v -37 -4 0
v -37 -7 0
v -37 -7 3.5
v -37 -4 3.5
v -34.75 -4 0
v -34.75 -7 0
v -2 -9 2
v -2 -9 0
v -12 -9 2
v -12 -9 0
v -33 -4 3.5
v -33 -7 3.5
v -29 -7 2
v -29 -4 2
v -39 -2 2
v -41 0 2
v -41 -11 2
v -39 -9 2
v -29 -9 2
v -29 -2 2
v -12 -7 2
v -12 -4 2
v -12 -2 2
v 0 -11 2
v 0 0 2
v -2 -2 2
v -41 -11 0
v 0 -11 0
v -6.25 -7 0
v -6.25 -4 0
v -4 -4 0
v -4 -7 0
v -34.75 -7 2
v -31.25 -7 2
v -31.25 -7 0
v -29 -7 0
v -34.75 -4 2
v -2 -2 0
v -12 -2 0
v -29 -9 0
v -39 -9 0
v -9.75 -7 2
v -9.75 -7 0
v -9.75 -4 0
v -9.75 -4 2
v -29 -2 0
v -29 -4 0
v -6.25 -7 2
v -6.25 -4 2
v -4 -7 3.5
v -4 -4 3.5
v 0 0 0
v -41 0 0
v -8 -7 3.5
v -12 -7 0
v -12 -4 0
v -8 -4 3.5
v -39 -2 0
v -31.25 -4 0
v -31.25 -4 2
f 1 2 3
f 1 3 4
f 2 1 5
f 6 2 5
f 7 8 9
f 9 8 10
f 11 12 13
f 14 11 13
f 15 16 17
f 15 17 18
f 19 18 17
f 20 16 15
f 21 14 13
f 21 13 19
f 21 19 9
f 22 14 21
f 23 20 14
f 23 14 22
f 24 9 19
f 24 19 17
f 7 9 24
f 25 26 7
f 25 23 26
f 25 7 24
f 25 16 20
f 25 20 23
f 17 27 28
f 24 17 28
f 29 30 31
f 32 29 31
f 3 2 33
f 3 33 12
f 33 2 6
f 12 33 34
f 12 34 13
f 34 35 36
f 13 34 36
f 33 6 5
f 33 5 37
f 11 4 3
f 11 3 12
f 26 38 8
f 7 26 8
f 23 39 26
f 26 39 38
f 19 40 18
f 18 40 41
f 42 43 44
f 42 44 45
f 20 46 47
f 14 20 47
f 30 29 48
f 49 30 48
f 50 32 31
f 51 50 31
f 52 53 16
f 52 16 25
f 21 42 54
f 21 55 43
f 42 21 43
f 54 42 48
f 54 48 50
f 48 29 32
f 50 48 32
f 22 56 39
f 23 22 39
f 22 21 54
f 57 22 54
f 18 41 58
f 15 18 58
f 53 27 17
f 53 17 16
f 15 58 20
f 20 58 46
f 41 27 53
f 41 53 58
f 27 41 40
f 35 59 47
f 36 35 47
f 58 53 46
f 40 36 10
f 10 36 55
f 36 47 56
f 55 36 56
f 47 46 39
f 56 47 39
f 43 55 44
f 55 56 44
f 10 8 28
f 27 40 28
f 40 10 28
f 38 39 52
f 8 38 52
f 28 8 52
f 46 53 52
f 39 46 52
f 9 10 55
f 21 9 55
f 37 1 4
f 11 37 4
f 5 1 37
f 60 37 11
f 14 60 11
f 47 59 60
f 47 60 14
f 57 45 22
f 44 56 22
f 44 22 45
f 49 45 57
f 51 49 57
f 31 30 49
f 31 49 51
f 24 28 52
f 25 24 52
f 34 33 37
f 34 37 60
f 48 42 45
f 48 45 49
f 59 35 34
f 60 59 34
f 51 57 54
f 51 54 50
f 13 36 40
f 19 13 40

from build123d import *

# Parameters (mm, degrees)
F0_W     = 41
F0_H     = 11
F1_DEPTH = 2
F0_W_2   = 8
F0_H_2   = 3
F2_DEPTH = 3.5
F3_W     = 3.5
F3_H     = 2
F4_DEPTH = 3
F5_W     = 3.5
F5_H     = 2
F6_DEPTH = 3


with BuildPart() as f1:
    # F0 (on Top) → F1 (new body)
    with BuildSketch(Plane.XY):
        with Locations((-20.5, -5.5)):
            Rectangle(F0_W, F0_H)
        Polygon((-39, -9), (-39, -2), (-29, -2), (-29, -4), (-29, -7), (-29, -9), align=None, mode=Mode.SUBTRACT)
        Polygon((-2, -9), (-12, -9), (-12, -7), (-12, -4), (-12, -2), (-2, -2), align=None, mode=Mode.SUBTRACT)
    extrude(amount=F1_DEPTH)

    # F0 (on Top) → F2 (join)
    with BuildSketch(Plane.XY):
        with Locations((-33, -5.5)):
            Rectangle(F0_W_2, F0_H_2)
        with Locations((-8, -5.5)):
            Rectangle(F0_W_2, F0_H_2)
    extrude(amount=F2_DEPTH)

    # F3 (on face) → F4 (cut, through all)
    with BuildSketch(Plane.XZ.offset(7)):
        Polygon((-33, 3.5), (-29, 2), (-29, 3.5), align=None)
        with Locations((-33, 1)):
            Rectangle(F3_W, F3_H)
    extrude(amount=-F4_DEPTH, mode=Mode.SUBTRACT)

    # F5 (on face) → F6 (cut, through all)
    with BuildSketch(Plane.XZ.offset(7)):
        Polygon((-8, 3.5), (-12, 3.5), (-12, 2), align=None)
        with Locations((-8, 1)):
            Rectangle(F5_W, F5_H)
    extrude(amount=-F6_DEPTH, mode=Mode.SUBTRACT)


solid = f1.part
